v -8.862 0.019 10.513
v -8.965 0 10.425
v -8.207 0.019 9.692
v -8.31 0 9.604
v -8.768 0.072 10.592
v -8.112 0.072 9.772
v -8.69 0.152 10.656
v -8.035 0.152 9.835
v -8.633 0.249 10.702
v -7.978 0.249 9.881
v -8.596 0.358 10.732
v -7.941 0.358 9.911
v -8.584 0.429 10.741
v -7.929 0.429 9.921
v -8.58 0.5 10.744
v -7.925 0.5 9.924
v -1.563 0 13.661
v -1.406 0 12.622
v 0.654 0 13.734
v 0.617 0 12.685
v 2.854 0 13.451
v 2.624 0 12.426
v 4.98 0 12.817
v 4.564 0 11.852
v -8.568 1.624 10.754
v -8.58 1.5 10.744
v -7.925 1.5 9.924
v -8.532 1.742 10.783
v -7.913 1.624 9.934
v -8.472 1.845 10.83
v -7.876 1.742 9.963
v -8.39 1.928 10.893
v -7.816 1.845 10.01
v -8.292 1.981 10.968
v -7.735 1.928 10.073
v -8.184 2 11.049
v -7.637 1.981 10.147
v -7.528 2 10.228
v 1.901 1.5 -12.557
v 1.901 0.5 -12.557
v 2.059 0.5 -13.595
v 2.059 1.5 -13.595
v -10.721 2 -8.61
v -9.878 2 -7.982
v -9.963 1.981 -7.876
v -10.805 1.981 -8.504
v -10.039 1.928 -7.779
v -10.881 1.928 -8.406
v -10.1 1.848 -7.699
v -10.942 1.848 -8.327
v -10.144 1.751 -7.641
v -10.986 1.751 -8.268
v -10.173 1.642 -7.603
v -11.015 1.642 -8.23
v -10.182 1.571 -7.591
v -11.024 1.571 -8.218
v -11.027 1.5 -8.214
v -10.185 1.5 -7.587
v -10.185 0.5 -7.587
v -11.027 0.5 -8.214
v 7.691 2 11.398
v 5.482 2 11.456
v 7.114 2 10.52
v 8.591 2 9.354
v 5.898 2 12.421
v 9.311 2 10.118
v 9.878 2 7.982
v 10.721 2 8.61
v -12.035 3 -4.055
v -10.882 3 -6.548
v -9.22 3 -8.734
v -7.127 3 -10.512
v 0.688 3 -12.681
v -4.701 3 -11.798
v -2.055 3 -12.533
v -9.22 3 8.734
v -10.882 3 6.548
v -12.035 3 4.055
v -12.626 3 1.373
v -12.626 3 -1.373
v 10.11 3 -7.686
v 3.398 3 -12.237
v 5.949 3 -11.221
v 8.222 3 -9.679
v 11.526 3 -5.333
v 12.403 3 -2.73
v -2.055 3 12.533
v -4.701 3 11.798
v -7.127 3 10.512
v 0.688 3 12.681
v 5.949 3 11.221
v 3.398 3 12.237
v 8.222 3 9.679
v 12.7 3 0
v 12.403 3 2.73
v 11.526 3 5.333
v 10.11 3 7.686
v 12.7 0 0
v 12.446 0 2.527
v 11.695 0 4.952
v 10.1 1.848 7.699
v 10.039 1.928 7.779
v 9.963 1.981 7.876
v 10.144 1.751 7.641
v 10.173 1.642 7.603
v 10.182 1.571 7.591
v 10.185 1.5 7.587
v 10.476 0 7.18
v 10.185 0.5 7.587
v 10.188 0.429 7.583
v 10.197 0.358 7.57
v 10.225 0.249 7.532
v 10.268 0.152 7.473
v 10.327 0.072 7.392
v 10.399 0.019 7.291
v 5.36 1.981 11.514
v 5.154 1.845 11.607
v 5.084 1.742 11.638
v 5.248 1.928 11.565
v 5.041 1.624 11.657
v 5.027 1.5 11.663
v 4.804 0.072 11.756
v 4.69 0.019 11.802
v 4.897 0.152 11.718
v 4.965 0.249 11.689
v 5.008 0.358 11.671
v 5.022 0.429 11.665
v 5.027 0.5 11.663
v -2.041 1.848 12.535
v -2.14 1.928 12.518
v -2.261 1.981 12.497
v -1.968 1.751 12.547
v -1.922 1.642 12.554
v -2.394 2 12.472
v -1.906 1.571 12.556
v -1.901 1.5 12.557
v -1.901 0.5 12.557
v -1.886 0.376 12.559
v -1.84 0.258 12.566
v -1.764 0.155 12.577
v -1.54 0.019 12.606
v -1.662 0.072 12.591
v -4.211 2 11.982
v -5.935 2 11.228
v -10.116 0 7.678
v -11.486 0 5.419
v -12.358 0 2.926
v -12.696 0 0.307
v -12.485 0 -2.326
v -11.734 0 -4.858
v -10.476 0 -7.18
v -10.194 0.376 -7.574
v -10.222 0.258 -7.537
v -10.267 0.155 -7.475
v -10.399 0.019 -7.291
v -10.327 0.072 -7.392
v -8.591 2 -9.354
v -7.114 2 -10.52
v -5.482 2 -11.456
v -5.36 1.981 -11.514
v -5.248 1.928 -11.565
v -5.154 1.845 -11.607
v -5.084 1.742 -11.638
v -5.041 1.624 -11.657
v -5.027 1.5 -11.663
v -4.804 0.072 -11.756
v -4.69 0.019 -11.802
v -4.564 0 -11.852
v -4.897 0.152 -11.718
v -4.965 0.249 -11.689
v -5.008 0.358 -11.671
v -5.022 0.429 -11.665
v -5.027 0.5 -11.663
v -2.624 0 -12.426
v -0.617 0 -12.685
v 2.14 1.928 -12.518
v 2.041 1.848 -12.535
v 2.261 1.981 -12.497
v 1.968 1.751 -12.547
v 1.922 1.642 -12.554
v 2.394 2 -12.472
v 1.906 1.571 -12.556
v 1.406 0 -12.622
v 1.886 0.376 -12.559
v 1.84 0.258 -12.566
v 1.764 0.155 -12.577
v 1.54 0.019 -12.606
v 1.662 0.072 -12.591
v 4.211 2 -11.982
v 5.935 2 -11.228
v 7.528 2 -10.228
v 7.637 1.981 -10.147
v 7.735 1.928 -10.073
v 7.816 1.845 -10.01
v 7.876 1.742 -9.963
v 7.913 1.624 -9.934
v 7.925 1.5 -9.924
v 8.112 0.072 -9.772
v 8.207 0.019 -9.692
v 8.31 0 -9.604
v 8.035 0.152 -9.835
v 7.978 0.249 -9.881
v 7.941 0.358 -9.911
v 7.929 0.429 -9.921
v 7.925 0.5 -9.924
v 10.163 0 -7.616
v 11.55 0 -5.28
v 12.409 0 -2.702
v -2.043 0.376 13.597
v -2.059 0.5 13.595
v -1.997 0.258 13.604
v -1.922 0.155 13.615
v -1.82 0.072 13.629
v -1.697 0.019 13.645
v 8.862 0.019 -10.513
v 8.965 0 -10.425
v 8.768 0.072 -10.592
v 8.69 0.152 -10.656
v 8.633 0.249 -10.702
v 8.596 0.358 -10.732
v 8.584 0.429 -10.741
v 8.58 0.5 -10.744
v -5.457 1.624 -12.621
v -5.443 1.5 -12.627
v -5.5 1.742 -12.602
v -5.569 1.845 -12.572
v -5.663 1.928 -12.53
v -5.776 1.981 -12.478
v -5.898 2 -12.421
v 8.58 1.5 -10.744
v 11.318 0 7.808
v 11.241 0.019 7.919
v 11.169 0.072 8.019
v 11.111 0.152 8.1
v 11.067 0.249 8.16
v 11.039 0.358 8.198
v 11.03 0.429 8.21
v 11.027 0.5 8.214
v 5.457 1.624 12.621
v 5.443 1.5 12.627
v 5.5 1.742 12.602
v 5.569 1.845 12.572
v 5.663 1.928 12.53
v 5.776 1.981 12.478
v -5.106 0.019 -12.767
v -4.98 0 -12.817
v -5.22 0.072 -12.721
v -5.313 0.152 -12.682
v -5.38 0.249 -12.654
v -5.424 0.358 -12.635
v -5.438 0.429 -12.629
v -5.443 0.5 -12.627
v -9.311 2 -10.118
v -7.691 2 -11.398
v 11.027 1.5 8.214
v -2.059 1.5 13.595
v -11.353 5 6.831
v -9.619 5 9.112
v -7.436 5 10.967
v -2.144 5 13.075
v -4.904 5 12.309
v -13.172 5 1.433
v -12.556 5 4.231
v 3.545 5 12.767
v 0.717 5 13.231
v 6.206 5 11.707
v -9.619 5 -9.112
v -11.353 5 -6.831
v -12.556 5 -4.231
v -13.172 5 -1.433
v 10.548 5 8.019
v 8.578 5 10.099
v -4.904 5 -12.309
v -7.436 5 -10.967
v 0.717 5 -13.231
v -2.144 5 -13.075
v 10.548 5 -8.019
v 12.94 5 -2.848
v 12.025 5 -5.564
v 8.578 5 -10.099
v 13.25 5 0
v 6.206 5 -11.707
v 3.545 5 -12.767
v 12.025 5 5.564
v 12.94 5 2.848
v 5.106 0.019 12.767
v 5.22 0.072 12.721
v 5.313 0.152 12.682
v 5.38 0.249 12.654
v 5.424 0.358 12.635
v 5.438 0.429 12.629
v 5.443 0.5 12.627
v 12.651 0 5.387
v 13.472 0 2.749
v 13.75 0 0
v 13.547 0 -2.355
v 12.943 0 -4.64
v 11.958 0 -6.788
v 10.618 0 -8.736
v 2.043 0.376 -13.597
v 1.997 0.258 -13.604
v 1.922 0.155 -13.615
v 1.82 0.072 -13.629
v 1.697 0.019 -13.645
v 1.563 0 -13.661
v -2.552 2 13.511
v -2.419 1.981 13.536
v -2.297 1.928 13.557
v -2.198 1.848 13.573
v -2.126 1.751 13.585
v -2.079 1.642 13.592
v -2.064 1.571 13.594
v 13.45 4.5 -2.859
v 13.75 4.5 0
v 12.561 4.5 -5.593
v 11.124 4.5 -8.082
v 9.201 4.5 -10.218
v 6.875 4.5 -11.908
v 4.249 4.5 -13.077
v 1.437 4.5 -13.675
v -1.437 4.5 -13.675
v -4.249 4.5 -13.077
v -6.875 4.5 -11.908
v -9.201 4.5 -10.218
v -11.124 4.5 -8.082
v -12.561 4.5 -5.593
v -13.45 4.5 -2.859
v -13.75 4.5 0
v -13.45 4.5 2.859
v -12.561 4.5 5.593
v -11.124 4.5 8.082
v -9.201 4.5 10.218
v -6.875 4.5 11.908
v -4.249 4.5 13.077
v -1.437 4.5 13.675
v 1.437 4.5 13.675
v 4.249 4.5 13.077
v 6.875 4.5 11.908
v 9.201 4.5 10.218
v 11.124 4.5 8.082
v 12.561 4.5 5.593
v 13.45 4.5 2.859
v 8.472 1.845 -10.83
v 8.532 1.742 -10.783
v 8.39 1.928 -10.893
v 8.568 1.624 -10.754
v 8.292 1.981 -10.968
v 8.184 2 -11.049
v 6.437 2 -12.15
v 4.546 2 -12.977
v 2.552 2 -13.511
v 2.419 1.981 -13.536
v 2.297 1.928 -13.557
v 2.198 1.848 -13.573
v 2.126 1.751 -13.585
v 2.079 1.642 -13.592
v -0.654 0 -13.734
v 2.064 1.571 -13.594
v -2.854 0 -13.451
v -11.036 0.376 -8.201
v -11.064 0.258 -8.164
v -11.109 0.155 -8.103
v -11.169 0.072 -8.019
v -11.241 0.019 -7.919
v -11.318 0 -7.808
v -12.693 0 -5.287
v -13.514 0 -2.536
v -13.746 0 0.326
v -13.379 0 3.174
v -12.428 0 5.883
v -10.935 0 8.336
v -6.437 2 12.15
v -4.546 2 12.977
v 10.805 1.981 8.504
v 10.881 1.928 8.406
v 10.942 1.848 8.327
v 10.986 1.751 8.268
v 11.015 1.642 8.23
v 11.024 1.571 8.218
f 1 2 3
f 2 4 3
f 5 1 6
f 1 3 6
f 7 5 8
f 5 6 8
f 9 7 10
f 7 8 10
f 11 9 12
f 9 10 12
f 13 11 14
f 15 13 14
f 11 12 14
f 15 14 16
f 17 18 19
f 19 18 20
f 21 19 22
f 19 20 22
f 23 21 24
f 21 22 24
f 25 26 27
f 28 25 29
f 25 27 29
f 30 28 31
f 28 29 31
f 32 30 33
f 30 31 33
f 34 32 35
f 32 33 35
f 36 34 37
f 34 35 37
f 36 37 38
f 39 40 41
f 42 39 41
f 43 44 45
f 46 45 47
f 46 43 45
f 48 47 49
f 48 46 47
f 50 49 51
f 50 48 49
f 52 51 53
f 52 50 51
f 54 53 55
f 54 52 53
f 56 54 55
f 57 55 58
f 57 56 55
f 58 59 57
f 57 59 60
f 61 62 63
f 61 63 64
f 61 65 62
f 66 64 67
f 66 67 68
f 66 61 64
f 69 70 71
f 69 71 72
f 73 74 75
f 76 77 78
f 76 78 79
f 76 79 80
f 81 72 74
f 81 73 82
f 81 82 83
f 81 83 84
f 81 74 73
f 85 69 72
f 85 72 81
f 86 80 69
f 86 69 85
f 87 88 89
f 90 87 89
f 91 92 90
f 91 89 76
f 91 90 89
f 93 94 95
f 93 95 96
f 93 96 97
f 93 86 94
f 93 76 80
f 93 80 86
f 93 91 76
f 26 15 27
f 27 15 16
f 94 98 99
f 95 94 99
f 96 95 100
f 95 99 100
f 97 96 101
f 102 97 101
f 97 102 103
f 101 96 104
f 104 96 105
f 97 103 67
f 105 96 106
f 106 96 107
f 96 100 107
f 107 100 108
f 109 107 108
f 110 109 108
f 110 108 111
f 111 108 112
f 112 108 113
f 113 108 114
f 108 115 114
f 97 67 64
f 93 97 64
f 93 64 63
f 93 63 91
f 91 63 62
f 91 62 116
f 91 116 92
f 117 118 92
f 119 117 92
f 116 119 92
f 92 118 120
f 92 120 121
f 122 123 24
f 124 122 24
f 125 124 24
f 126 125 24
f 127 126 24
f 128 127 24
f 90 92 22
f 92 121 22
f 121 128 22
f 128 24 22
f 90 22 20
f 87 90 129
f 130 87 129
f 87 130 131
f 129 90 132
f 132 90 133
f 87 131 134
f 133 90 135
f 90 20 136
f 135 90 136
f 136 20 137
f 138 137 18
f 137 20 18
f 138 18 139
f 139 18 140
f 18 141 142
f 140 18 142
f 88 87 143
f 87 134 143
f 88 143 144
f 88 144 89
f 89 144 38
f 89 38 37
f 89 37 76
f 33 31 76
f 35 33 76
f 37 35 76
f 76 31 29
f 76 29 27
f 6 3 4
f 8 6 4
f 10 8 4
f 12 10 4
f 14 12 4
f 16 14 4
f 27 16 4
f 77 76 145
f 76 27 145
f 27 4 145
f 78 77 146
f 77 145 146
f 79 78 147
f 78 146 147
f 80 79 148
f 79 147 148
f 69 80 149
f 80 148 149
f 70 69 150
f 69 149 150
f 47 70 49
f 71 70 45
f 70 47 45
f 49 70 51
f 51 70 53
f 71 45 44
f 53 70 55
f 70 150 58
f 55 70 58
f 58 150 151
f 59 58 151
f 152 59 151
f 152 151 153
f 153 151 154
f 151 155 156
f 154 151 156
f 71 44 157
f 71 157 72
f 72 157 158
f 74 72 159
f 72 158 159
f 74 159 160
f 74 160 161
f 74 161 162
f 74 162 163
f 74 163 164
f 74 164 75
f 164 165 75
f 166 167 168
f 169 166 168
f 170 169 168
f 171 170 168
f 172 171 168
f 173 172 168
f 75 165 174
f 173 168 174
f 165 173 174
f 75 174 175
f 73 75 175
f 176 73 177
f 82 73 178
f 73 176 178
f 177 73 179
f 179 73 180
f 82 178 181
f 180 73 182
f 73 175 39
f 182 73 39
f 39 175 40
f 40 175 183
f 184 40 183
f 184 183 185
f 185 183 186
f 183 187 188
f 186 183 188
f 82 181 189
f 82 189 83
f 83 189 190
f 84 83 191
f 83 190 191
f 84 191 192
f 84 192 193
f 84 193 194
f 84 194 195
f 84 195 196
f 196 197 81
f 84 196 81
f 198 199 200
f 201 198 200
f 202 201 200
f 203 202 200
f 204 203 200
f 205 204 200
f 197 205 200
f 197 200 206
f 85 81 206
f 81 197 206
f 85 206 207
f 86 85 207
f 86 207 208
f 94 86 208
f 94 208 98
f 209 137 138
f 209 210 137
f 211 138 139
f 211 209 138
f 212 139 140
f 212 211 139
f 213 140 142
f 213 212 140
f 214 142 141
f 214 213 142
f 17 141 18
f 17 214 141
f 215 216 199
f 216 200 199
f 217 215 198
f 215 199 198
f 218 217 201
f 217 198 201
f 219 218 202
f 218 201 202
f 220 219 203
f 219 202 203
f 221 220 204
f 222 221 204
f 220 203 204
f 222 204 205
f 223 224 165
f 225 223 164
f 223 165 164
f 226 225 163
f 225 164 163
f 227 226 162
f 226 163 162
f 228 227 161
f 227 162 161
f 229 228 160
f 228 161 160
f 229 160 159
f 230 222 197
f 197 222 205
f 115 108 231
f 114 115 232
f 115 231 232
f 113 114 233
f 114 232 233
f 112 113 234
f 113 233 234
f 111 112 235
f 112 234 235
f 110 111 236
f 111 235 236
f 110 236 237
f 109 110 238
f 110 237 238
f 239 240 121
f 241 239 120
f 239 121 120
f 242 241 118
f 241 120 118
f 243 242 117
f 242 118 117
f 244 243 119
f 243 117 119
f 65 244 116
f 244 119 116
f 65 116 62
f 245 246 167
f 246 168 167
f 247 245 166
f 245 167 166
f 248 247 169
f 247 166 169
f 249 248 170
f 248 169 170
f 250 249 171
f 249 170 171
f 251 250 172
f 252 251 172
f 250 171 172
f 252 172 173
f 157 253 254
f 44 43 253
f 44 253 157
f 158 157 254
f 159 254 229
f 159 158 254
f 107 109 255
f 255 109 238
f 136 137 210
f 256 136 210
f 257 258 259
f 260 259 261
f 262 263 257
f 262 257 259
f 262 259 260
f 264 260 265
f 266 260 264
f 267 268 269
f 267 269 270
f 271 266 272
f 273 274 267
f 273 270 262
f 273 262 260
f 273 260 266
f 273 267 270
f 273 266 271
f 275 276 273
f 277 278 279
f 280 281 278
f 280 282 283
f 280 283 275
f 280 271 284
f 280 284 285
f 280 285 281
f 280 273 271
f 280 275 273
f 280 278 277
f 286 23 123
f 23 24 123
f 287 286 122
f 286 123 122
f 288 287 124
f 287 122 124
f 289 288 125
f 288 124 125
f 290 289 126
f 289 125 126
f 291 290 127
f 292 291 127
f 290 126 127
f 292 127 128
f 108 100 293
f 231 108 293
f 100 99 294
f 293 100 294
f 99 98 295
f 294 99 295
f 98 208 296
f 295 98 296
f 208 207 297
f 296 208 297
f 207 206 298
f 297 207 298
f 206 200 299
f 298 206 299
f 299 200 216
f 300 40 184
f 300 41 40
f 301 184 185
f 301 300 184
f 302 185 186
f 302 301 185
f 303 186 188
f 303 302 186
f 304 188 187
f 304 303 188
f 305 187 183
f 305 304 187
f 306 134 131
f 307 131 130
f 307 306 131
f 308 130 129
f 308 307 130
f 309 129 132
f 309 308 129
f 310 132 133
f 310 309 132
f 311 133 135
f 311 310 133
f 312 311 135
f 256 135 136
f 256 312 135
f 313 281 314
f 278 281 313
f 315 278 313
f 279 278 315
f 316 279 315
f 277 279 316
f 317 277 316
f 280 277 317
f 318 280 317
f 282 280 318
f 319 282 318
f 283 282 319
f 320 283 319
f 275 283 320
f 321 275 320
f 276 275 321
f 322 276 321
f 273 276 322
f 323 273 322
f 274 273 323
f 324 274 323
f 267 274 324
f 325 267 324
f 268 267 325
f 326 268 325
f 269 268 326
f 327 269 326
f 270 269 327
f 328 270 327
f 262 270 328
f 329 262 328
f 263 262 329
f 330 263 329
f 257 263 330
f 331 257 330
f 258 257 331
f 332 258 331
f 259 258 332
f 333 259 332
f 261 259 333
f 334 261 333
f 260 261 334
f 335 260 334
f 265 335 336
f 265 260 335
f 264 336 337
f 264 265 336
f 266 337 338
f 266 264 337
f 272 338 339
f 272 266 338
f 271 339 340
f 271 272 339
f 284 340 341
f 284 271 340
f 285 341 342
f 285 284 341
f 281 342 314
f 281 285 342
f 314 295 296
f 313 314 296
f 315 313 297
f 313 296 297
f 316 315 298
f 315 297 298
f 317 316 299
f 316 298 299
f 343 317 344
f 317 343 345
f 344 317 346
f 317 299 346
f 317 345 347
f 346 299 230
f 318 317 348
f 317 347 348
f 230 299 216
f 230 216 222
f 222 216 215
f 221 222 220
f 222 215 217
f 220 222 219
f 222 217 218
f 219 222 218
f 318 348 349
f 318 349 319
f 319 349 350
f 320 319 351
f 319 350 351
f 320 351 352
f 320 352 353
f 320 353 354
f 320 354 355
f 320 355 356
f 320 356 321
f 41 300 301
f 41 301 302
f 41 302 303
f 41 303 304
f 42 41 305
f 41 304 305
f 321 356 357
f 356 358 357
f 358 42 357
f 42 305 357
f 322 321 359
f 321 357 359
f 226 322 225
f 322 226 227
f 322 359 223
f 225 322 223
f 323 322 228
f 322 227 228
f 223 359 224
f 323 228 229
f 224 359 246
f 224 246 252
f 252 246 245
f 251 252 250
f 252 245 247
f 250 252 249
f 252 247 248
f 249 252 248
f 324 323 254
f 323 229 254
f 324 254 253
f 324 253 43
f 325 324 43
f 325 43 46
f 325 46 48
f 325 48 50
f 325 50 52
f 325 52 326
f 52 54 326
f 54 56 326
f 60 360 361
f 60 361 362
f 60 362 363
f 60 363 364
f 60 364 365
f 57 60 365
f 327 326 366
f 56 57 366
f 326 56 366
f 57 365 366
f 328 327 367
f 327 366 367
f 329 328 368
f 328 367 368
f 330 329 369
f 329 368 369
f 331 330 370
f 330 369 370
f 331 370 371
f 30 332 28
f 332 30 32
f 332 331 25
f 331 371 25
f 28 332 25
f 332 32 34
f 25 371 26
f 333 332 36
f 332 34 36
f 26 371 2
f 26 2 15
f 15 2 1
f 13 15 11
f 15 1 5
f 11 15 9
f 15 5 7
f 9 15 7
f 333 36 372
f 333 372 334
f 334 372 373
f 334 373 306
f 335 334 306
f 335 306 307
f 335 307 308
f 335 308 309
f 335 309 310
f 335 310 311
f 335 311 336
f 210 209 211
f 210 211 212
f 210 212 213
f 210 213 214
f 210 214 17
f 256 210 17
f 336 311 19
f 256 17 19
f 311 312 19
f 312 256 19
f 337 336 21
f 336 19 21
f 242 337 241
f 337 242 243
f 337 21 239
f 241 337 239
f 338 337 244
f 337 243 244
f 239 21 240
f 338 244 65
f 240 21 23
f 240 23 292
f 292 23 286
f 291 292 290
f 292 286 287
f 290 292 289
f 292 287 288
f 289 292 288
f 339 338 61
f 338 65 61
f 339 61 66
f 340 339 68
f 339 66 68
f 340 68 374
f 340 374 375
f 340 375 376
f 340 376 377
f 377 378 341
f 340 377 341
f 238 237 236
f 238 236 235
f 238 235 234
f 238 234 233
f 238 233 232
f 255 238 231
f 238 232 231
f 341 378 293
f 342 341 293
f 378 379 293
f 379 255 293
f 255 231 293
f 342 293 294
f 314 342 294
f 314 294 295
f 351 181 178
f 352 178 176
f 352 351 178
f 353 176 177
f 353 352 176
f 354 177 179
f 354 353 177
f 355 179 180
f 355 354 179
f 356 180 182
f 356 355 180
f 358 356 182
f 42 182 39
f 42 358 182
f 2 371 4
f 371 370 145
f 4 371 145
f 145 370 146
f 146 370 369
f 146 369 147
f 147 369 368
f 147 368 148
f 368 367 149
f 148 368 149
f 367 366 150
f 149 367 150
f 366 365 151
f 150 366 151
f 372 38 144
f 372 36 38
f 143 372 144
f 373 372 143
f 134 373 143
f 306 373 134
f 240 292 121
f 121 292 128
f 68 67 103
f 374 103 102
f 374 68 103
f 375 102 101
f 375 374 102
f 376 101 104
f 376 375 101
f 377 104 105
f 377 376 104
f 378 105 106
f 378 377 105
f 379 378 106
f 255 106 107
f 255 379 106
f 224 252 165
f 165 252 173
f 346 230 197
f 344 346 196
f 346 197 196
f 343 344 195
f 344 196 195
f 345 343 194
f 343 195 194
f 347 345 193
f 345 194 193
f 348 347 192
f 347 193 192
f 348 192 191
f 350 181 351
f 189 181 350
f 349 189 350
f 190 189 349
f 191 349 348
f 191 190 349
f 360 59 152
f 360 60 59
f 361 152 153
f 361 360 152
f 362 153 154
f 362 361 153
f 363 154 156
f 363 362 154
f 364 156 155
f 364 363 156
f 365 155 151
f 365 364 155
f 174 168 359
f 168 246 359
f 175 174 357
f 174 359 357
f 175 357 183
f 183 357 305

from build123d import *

# Parameters (mm, degrees)
SKETCH1_R           = 13.75
BOSS_EXTRUDE1_DEPTH = 5
SKETCH2_R           = 12.7
CUT_EXTRUDE1_DEPTH  = 3
CHAMFER1_SIZE       = 0.5
CUT_EXTRUDE2_DEPTH  = 2
FILLET1_R           = 0.5


with BuildPart() as part:
    # Sketch1 → Boss-Extrude1 (new body)
    with BuildSketch(Plane(origin=(0, 0, 0), x_dir=(1, 0, 0), z_dir=(0, 1, 0))):
        Circle(SKETCH1_R)
    extrude(amount=BOSS_EXTRUDE1_DEPTH)

    # Sketch2 → Cut-Extrude1 (cut)
    with BuildSketch(Plane.XZ):
        Circle(SKETCH2_R)
    extrude(amount=-CUT_EXTRUDE1_DEPTH, mode=Mode.SUBTRACT)

    # Chamfer1
    chamfer1_edges = [part.edges().sort_by_distance(p)[0] for p in [
        (-13.75, 5, 0),
    ]]
    chamfer(chamfer1_edges, length=CHAMFER1_SIZE)

    # Sketch4 → Cut-Extrude2 (cut)
    with BuildSketch(Plane.XZ):
        with BuildLine():
            Line((8.580294574, -10.744349446), (7.92507208, -9.923871852))
            ThreePointArc((7.92507208, -9.923871852), (5.08654476, -11.636883707), (1.901377822, -12.556861167))
            Line((1.901377822, -12.556861167), (2.05857835, -13.595026855))
            ThreePointArc((2.05857835, -13.595026855), (5.507085863, -12.598988265), (8.580294574, -10.744349446))
        make_face()
        with BuildLine():
            Line((-5.442522653, -12.627012599), (-5.026911832, -11.662768001))
            ThreePointArc((-5.026911832, -11.662768001), (-7.874170442, -9.964308298), (-10.184817349, -7.586797451))
            Line((-10.184817349, -7.586797451), (-11.026869177, -8.214052358))
            ThreePointArc((-11.026869177, -8.214052358), (-8.525184534, -10.788129062), (-5.442522653, -12.627012599))
        make_face()
        with BuildLine():
            Line((-8.580294574, 10.744349446), (-7.92507208, 9.923871852))
            ThreePointArc((-7.92507208, 9.923871852), (-5.08654476, 11.636883707), (-1.901377822, 12.556861167))
            Line((-1.901377822, 12.556861167), (-2.05857835, 13.595026855))
            ThreePointArc((-2.05857835, 13.595026855), (-5.507085863, 12.598988265), (-8.580294574, 10.744349446))
        make_face()
        with BuildLine():
            Line((5.442522653, 12.627012599), (5.026911832, 11.662768001))
            ThreePointArc((5.026911832, 11.662768001), (7.874170442, 9.964308298), (10.184817349, 7.586797451))
            Line((10.184817349, 7.586797451), (11.026869177, 8.214052358))
            ThreePointArc((11.026869177, 8.214052358), (8.525184534, 10.788129062), (5.442522653, 12.627012599))
        make_face()
    extrude(amount=-CUT_EXTRUDE2_DEPTH, mode=Mode.SUBTRACT)

    # Fillet1
    fillet1_edges = [part.edges().sort_by_distance(p)[0] for p in [
        (5.234717242, 0, 12.1448903),
        (10.605843263, 2, 7.900424905),
        (5.234717242, 2, 12.1448903),
        (10.605843263, 0, 7.900424905),
        (-8.252683327, 0, 10.334110649),
        (-1.979978086, 2, 13.075944011),
        (-8.252683327, 2, 10.334110649),
        (-1.979978086, 0, 13.075944011),
        (-5.234717242, 0, -12.1448903),
        (-10.605843263, 2, -7.900424905),
        (-5.234717242, 2, -12.1448903),
        (-10.605843263, 0, -7.900424905),
        (8.252683327, 0, -10.334110649),
        (1.979978086, 2, -13.075944011),
        (8.252683327, 2, -10.334110649),
        (1.979978086, 0, -13.075944011),
    ]]
    fillet(fillet1_edges, radius=FILLET1_R)


solid = part.part
